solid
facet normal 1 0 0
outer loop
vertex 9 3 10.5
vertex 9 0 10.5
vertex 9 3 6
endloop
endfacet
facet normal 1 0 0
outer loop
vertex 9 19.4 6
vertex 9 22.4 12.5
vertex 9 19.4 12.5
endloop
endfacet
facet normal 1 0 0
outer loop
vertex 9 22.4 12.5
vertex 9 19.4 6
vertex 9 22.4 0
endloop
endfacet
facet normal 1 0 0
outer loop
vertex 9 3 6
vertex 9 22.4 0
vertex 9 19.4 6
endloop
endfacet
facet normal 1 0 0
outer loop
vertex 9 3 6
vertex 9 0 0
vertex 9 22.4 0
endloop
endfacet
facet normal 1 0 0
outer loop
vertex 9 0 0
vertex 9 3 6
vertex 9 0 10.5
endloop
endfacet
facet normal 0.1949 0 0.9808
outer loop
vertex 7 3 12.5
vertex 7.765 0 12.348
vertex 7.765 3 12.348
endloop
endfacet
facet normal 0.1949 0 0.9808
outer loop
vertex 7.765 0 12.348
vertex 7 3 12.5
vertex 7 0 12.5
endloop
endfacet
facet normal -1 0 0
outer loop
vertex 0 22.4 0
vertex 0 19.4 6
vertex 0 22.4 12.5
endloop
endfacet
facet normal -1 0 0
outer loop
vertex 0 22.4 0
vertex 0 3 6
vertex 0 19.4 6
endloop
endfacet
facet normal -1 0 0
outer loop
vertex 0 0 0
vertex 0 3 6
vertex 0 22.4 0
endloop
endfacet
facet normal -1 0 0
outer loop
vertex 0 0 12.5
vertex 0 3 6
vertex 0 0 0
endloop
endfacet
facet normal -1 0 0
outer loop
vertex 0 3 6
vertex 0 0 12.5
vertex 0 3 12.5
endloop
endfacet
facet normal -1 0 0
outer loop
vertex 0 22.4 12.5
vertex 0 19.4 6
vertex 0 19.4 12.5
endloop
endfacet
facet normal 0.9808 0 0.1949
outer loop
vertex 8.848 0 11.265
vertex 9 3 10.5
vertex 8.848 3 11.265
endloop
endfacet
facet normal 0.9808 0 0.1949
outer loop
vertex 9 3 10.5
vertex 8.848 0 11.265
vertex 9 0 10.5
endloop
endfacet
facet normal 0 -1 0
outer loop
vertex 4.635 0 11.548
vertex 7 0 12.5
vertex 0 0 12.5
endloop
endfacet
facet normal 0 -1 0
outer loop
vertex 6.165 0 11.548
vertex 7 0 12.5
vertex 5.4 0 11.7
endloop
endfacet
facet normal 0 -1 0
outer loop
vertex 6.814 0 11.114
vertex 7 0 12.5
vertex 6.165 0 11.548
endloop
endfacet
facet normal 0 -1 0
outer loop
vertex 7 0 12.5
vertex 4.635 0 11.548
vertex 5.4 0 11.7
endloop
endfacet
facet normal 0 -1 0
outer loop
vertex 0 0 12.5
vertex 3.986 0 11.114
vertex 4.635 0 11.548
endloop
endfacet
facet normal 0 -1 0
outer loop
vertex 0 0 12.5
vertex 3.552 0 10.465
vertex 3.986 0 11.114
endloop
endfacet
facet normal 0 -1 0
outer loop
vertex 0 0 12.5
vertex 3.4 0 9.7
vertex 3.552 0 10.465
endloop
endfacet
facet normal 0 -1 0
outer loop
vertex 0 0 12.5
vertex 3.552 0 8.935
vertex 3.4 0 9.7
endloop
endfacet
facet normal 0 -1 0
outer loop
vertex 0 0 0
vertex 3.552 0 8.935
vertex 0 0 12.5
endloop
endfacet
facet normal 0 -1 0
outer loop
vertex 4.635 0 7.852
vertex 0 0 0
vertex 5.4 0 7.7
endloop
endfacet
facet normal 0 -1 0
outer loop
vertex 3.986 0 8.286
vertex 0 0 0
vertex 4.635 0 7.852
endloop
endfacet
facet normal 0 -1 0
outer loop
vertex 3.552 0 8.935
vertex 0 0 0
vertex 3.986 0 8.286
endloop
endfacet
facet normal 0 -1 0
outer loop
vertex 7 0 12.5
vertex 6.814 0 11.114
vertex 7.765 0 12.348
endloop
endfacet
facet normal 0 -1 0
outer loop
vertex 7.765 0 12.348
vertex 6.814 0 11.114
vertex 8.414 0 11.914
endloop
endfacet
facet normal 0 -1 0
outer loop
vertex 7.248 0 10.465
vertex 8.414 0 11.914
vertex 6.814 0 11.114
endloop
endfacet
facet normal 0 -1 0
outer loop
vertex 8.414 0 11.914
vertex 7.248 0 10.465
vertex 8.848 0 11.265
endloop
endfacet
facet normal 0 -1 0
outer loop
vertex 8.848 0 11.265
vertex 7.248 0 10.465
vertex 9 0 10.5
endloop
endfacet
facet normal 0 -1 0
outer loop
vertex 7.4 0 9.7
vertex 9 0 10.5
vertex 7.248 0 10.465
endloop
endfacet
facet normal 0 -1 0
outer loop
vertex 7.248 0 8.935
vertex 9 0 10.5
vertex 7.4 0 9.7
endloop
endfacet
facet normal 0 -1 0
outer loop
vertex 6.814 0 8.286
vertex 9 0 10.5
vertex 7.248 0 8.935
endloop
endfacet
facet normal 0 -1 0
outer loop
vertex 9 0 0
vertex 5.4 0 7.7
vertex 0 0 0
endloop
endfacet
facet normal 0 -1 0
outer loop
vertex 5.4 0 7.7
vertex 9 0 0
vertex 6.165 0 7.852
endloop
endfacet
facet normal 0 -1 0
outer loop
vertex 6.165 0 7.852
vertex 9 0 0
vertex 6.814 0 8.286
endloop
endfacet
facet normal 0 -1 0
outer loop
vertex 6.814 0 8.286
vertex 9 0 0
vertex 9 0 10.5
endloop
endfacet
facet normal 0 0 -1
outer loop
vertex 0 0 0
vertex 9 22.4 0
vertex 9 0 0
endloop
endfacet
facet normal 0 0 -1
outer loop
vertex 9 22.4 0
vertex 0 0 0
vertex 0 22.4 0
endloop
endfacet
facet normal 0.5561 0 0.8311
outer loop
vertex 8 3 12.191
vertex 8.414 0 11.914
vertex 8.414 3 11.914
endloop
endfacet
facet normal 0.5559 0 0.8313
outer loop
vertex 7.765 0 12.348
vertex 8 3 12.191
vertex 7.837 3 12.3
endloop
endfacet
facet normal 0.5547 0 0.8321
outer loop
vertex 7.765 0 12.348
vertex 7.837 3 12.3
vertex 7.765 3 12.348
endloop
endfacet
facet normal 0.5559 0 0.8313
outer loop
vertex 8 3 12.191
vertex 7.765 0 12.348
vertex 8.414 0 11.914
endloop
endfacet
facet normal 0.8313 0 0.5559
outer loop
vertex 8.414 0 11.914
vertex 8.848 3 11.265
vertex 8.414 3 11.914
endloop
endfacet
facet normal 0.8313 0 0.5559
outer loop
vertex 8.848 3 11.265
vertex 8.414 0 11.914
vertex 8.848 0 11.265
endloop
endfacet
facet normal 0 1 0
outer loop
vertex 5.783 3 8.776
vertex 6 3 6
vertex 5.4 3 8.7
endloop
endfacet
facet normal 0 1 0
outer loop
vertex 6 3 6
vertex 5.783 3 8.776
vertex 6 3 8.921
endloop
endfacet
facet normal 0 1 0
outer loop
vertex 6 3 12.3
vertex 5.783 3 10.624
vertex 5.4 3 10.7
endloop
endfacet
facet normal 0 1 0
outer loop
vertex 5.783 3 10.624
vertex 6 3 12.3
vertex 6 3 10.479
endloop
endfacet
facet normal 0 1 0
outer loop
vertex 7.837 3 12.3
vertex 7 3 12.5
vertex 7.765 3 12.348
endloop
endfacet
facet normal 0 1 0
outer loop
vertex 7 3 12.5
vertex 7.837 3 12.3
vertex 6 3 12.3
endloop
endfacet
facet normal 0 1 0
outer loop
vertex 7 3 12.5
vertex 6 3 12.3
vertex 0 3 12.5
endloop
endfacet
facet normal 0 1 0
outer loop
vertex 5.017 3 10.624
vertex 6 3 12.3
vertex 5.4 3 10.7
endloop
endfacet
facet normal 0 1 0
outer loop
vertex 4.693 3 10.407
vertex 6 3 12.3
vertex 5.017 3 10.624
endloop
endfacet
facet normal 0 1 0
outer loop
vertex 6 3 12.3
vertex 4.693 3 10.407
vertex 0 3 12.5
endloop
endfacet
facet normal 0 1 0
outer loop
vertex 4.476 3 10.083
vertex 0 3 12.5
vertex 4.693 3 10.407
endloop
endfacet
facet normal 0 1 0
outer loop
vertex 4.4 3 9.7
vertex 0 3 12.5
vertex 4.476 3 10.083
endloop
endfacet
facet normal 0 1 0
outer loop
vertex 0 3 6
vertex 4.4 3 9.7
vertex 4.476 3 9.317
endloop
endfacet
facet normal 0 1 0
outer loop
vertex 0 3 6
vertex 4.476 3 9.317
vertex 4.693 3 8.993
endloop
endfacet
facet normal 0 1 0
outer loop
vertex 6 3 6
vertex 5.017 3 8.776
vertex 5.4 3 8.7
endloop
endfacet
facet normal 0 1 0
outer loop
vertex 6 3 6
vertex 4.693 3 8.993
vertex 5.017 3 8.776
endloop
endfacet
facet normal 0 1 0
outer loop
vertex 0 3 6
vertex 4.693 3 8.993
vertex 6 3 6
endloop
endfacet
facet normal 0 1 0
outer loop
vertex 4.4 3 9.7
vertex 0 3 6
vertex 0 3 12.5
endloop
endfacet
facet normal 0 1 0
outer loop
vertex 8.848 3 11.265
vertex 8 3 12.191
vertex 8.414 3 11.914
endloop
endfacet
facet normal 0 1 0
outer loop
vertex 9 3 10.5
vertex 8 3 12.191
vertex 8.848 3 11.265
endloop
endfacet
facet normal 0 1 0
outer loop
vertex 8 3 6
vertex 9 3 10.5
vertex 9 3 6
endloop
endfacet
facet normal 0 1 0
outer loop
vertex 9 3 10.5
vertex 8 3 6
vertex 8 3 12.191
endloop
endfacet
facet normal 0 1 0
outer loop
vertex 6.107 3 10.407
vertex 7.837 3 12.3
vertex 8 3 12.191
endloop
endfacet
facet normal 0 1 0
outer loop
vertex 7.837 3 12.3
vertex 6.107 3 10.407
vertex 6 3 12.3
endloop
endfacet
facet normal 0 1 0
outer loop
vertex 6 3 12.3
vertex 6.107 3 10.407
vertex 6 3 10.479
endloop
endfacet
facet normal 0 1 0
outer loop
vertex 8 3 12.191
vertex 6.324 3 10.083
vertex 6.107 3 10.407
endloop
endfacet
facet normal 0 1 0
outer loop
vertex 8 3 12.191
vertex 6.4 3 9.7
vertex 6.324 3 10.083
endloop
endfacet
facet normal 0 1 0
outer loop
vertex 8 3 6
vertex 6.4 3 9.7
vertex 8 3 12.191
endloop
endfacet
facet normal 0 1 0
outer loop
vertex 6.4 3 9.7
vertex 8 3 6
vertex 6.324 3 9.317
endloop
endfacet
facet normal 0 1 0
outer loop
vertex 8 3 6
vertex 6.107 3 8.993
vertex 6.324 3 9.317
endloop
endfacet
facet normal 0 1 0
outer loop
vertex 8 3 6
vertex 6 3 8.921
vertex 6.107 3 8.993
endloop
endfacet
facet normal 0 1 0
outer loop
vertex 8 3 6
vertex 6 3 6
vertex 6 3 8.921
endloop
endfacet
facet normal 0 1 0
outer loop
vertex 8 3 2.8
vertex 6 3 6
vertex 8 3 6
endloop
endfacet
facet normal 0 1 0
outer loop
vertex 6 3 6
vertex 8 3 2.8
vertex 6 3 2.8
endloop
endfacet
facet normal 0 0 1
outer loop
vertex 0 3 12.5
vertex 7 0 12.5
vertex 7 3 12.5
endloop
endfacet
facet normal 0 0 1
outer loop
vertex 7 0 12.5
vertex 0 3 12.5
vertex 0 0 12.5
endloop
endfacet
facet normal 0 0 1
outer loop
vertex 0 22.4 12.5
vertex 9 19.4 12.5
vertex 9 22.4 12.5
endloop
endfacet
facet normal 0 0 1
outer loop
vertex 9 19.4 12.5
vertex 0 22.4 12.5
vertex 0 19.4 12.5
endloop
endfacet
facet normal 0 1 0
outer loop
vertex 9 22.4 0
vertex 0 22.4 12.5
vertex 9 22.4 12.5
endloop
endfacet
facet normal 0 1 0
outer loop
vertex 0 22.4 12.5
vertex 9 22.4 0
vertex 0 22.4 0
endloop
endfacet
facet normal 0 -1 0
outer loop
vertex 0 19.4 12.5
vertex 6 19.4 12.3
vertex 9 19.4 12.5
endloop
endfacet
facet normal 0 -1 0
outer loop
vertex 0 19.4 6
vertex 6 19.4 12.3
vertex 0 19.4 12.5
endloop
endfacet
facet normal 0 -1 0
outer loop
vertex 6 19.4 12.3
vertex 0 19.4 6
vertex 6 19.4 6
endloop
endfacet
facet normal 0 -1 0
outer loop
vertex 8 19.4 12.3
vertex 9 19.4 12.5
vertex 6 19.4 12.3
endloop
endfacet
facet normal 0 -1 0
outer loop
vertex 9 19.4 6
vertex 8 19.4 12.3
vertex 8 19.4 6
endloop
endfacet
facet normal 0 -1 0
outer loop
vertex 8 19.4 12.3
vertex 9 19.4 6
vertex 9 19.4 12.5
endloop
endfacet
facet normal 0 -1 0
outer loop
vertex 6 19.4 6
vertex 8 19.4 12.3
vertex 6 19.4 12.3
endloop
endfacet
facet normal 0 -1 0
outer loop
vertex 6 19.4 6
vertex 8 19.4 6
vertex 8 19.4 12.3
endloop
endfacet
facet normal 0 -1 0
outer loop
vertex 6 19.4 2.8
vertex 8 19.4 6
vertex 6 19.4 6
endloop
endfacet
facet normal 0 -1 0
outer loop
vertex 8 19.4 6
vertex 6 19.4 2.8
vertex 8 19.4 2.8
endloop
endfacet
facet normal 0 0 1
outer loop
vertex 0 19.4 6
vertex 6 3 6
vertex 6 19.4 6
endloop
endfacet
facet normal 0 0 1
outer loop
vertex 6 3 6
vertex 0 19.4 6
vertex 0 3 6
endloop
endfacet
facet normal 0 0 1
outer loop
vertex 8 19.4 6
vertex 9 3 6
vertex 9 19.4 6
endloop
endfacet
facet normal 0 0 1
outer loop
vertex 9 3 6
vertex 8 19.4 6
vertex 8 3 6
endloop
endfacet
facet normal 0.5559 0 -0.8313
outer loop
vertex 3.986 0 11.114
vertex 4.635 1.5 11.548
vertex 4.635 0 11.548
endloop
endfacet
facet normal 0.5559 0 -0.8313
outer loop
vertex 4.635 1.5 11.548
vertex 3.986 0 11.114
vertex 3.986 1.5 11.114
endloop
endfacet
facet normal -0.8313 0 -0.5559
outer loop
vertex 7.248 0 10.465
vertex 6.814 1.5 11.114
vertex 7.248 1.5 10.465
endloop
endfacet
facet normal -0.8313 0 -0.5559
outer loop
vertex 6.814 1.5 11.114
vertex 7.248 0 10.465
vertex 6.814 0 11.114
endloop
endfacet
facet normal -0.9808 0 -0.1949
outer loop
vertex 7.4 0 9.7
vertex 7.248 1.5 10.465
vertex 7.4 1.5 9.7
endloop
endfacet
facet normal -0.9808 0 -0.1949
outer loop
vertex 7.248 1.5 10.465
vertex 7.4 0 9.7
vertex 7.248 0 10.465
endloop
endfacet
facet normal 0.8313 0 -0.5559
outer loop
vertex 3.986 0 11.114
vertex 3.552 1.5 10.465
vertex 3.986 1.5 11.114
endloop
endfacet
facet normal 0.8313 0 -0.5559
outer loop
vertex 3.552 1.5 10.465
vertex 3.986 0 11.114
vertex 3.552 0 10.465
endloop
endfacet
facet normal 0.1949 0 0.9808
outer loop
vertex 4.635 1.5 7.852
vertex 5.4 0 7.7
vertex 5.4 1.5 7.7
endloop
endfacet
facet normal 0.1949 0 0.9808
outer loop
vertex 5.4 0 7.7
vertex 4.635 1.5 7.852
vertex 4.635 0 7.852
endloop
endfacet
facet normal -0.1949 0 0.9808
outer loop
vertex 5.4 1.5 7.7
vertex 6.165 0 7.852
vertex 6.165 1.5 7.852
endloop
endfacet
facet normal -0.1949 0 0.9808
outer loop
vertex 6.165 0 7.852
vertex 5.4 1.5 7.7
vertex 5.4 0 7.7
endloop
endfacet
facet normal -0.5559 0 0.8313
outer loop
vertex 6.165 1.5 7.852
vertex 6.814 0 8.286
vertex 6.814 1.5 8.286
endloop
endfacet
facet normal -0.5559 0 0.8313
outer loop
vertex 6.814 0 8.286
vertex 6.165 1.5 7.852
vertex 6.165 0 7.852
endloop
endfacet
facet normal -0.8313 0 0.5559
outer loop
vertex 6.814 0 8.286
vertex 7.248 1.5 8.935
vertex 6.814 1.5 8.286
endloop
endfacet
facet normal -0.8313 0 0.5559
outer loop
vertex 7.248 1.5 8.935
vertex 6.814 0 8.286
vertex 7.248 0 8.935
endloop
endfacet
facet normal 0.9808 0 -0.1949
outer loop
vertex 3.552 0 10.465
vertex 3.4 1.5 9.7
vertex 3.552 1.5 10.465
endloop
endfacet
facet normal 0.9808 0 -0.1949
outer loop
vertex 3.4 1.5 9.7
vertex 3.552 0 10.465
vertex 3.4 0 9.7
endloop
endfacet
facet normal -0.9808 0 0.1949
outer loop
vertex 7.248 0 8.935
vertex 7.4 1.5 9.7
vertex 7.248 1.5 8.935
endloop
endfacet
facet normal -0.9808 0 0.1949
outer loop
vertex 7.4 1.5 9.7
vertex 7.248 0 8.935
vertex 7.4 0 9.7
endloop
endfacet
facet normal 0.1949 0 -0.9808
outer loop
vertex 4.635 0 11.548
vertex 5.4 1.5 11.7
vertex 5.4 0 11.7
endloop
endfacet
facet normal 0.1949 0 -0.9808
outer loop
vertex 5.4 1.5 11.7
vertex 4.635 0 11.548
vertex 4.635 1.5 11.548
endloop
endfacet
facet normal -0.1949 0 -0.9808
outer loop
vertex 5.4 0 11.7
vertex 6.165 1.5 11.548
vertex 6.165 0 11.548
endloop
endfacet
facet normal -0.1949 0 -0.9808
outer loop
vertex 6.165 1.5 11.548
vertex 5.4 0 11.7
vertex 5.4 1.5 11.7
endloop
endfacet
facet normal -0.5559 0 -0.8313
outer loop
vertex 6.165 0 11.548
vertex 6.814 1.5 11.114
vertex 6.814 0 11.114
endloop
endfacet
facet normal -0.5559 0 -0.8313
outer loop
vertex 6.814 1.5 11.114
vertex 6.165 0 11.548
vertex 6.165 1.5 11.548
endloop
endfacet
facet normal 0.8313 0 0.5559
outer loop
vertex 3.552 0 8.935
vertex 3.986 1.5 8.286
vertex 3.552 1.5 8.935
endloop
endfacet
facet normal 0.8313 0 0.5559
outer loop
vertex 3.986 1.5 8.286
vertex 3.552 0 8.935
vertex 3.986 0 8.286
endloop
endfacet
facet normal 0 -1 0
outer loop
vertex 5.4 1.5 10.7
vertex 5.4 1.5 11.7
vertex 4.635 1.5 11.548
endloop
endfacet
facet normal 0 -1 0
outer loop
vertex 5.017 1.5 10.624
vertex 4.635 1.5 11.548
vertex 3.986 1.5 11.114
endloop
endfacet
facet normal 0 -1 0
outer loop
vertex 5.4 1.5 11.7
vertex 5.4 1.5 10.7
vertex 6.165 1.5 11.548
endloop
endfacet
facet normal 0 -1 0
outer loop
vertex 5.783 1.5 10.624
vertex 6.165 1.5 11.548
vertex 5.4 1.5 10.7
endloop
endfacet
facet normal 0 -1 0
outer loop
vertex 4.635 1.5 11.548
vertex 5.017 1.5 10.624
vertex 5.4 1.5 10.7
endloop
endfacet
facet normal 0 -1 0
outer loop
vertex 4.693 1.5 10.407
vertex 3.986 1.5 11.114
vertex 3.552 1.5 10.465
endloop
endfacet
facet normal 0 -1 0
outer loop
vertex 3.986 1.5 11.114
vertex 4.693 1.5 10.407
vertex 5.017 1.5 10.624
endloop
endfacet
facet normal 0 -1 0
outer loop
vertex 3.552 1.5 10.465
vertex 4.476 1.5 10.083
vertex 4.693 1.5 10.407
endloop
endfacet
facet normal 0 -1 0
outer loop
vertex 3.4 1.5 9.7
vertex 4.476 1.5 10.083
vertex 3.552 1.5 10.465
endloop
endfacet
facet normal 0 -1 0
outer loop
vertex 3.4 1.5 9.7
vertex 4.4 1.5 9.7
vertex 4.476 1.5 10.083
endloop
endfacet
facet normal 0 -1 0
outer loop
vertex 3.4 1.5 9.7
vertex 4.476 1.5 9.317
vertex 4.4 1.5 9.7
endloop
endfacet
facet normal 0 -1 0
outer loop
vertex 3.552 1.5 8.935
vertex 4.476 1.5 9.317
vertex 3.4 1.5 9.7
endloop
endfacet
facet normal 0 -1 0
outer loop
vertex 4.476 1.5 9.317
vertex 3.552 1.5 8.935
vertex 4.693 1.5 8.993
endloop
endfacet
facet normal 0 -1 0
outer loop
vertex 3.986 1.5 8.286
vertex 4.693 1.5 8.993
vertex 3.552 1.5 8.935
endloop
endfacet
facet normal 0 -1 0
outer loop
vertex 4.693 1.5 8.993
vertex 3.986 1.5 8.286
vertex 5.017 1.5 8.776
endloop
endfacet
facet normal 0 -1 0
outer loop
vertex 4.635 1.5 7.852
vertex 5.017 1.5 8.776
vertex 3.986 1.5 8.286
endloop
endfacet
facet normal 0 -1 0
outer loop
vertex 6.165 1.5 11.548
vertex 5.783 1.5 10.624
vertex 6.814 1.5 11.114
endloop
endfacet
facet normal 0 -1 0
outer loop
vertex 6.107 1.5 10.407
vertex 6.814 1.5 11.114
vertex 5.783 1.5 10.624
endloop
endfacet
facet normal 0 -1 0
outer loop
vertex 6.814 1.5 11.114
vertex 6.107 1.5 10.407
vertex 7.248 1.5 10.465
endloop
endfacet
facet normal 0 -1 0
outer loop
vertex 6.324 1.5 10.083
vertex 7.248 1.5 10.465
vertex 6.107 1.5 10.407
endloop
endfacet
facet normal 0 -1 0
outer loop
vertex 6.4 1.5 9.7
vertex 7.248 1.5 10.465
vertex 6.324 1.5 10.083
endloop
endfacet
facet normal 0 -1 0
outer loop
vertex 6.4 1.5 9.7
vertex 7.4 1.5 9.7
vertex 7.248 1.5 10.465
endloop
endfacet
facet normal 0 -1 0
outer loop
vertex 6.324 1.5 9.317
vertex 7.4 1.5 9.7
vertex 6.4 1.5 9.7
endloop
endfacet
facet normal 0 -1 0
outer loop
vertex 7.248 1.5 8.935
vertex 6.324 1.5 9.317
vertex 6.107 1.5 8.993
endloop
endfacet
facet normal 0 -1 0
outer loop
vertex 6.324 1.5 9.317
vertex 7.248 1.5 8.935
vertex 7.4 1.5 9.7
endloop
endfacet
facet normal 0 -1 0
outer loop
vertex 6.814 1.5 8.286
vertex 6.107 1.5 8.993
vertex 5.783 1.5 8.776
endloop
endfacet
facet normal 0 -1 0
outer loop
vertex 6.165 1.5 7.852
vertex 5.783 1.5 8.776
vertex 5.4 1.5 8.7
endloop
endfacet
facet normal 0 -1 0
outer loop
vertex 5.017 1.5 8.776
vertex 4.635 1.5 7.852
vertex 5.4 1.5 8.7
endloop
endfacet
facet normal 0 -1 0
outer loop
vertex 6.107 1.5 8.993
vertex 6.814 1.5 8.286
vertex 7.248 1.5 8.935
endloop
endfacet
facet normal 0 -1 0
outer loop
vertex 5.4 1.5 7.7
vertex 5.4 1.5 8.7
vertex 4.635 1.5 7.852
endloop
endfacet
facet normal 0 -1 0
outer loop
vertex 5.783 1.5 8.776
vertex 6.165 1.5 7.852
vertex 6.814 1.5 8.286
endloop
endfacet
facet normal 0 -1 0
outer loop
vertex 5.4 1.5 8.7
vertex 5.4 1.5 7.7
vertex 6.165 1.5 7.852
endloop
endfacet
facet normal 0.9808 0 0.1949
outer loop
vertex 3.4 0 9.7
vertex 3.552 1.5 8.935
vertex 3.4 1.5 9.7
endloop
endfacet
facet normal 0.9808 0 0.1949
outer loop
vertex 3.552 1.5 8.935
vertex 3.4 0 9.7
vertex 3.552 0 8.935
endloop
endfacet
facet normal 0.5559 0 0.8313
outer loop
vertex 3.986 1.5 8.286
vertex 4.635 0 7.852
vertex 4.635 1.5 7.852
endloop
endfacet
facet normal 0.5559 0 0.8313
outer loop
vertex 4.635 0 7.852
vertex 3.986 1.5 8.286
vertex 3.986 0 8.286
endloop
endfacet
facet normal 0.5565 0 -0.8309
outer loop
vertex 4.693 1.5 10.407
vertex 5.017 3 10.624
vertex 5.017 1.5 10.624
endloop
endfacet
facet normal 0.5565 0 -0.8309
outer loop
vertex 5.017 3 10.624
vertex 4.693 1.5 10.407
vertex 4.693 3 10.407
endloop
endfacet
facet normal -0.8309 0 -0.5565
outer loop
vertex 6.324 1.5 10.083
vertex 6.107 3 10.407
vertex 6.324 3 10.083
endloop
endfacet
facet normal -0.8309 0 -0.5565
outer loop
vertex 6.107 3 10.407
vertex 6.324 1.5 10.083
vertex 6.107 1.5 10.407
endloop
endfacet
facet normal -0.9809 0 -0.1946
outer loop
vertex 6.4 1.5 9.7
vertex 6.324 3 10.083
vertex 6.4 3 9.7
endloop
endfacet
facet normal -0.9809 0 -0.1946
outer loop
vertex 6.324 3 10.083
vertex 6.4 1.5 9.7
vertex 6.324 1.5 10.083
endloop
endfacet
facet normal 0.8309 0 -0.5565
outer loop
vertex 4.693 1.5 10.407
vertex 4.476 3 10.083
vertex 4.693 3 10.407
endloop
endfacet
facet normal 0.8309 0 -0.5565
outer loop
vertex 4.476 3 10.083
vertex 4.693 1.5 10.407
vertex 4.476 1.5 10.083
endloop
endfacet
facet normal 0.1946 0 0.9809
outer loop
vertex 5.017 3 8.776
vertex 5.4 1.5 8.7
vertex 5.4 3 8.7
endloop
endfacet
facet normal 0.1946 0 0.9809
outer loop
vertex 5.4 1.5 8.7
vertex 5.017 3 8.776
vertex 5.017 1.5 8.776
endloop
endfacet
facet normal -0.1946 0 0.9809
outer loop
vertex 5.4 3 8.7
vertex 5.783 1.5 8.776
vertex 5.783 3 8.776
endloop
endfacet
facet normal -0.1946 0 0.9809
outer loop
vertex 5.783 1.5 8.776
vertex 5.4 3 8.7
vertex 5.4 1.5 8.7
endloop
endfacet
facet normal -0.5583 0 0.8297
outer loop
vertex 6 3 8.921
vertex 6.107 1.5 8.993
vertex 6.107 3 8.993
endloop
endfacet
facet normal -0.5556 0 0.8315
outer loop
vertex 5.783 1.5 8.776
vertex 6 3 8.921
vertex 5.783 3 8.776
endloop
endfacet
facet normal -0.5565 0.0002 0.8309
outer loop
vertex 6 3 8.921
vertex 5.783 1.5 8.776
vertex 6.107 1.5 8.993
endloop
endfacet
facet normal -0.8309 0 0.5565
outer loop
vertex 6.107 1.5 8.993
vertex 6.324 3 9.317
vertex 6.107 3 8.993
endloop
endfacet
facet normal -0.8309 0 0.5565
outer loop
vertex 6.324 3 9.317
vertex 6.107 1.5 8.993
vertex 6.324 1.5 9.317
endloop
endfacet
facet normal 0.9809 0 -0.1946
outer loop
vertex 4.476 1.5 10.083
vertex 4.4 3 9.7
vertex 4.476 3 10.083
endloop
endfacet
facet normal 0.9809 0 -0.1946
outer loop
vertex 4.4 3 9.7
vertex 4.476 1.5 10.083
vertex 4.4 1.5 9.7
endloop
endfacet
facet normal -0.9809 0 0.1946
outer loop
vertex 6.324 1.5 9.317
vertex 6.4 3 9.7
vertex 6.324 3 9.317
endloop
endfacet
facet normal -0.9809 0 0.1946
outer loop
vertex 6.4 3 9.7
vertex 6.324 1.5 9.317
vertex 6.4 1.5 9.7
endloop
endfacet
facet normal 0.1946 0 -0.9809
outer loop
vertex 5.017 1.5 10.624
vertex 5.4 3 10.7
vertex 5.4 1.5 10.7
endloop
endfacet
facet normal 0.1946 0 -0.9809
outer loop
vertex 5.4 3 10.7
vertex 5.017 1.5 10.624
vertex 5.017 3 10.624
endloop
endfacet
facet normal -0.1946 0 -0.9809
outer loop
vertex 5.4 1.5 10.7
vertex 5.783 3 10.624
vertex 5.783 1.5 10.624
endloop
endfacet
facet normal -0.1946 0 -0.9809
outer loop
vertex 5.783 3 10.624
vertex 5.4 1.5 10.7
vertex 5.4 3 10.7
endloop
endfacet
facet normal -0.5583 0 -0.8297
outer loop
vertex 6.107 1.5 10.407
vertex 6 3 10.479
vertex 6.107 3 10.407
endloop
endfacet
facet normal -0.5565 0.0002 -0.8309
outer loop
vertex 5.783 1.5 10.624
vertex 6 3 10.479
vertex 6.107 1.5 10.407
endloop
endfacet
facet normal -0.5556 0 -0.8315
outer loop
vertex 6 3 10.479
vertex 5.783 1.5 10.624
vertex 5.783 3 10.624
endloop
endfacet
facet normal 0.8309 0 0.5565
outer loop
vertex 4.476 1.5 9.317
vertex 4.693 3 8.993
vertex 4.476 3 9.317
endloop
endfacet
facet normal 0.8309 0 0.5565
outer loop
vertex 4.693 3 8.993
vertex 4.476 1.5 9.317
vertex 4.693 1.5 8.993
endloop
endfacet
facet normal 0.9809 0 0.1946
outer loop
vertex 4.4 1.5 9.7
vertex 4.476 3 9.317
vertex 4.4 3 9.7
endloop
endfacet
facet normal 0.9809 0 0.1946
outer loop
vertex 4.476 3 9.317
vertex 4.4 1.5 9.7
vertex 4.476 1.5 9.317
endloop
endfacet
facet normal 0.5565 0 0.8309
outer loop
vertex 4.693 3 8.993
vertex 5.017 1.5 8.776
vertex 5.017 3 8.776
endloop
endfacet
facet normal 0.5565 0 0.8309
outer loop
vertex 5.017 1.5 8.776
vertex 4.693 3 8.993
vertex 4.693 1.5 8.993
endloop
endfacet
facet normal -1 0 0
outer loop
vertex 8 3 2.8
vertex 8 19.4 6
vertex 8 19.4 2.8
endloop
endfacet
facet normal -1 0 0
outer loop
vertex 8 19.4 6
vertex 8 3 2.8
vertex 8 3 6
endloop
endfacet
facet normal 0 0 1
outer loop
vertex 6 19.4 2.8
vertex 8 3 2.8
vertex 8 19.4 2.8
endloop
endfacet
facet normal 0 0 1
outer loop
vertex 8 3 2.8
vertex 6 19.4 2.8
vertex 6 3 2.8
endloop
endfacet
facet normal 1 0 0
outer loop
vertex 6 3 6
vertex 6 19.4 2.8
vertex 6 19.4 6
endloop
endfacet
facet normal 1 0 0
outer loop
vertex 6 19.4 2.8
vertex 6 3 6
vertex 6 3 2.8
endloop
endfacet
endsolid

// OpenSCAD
/*
Generic Action Camera Adapter for 3DR Solo
Copyright (C) 2016 - 2017  Hugh Eaves

This program is free software: you can redistribute it and/or modify
it under the terms of the GNU General Public License as published by
the Free Software Foundation, either version 3 of the License, or
(at your option) any later version.

This program is distributed in the hope that it will be useful,
but WITHOUT ANY WARRANTY; without even the implied warranty of
MERCHANTABILITY or FITNESS FOR A PARTICULAR PURPOSE.  See the
GNU General Public License for more details.

You should have received a copy of the GNU General Public License
along with this program.  If not, see <http://www.gnu.org/licenses/>.
*/

include <main.scad>

bracket();
